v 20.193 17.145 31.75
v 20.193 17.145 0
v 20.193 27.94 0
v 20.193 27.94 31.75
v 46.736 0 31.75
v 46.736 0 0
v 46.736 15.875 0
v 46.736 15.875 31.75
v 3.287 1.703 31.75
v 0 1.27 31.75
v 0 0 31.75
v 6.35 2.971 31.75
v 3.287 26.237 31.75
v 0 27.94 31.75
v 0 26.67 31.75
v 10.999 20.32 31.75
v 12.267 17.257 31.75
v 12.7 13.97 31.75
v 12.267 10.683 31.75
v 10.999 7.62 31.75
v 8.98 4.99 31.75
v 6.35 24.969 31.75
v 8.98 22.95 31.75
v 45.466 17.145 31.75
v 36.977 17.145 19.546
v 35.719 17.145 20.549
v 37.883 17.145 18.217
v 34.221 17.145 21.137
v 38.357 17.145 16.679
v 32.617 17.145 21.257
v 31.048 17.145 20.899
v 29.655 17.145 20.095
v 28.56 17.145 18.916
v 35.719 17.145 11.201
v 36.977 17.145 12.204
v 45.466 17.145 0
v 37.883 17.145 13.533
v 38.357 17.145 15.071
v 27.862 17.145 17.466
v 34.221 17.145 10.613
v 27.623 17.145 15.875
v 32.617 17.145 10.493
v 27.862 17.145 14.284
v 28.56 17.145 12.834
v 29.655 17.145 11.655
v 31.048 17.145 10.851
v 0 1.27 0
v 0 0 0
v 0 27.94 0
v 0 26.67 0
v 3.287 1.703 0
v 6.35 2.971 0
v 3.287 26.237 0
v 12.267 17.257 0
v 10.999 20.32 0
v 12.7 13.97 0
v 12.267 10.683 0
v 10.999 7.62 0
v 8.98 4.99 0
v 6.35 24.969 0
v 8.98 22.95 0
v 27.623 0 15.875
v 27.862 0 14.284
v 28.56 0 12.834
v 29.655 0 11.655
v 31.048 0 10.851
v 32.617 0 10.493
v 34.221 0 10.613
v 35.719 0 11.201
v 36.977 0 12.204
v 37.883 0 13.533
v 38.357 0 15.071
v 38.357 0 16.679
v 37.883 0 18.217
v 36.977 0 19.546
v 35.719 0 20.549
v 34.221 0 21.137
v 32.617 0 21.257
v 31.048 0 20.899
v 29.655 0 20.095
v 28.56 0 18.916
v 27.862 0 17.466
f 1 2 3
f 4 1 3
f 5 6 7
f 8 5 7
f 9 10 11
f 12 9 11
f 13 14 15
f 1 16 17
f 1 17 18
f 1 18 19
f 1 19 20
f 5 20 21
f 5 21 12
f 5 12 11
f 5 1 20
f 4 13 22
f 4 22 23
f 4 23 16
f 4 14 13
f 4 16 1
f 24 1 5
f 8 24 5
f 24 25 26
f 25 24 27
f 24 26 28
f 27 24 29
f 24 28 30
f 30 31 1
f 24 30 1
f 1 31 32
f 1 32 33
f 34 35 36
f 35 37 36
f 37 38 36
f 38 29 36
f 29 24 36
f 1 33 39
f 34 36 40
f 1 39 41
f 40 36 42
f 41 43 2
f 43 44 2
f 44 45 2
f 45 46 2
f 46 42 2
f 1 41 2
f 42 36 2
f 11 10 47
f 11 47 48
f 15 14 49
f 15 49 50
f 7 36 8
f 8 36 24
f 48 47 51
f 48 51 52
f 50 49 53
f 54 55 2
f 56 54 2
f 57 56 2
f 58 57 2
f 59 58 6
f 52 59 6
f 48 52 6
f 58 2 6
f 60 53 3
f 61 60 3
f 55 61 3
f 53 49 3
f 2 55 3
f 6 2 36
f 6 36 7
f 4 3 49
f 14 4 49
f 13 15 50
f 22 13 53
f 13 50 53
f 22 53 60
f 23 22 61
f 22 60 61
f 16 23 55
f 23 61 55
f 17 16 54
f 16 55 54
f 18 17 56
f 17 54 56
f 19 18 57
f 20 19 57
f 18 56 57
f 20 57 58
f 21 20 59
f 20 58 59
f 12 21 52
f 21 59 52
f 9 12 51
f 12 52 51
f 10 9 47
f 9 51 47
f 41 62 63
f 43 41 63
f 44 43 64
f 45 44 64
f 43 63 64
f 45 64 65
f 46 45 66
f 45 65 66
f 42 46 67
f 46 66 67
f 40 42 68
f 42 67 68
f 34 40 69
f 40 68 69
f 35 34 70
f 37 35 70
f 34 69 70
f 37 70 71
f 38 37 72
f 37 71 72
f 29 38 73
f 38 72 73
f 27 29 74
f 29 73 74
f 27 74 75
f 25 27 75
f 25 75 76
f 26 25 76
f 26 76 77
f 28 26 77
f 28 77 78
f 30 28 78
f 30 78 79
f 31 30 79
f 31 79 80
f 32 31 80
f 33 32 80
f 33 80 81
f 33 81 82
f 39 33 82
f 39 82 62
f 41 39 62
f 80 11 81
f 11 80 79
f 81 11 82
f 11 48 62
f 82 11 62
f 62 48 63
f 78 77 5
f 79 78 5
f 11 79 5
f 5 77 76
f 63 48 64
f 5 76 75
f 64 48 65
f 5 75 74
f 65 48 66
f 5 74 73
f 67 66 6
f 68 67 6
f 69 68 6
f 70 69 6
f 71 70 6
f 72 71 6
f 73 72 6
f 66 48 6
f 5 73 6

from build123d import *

# Parameters (mm, degrees)
BOSS_EXTRUDE1_DEPTH      = 31.75
X_0_397_DIAMETER_HOLE1_D = 10.795
CHAMFER1_SIZE            = 1.27


with BuildPart() as part:
    # Sketch1 → Boss-Extrude1 (new body)
    with BuildSketch(Plane.XY):
        with BuildLine():
            Line((46.736, 0), (46.736, 17.145))
            Line((46.736, 17.145), (20.193, 17.145))
            Line((20.193, 17.145), (20.193, 27.94))
            Line((20.193, 27.94), (0, 27.94))
            Line((0, 27.94), (0, 26.67))
            ThreePointArc((0, 26.67), (12.7, 13.97), (0, 1.27))
            Line((0, 1.27), (0, 0))
            Line((0, 0), (46.736, 0))
        make_face()
    extrude(amount=BOSS_EXTRUDE1_DEPTH)

    # X (0.397) Diameter Hole1 (through all)
    with Locations(Plane(origin=(0, 17.145, 0), x_dir=(1, 0, 0), z_dir=(0, 1, 0))):
        with Locations((33.02, -15.875)):
            Hole(X_0_397_DIAMETER_HOLE1_D / 2)

    # Chamfer1
    chamfer1_edges = [part.edges().sort_by_distance(p)[0] for p in [
        (46.736, 17.145, 15.875),
    ]]
    chamfer(chamfer1_edges, length=CHAMFER1_SIZE)


solid = part.part
